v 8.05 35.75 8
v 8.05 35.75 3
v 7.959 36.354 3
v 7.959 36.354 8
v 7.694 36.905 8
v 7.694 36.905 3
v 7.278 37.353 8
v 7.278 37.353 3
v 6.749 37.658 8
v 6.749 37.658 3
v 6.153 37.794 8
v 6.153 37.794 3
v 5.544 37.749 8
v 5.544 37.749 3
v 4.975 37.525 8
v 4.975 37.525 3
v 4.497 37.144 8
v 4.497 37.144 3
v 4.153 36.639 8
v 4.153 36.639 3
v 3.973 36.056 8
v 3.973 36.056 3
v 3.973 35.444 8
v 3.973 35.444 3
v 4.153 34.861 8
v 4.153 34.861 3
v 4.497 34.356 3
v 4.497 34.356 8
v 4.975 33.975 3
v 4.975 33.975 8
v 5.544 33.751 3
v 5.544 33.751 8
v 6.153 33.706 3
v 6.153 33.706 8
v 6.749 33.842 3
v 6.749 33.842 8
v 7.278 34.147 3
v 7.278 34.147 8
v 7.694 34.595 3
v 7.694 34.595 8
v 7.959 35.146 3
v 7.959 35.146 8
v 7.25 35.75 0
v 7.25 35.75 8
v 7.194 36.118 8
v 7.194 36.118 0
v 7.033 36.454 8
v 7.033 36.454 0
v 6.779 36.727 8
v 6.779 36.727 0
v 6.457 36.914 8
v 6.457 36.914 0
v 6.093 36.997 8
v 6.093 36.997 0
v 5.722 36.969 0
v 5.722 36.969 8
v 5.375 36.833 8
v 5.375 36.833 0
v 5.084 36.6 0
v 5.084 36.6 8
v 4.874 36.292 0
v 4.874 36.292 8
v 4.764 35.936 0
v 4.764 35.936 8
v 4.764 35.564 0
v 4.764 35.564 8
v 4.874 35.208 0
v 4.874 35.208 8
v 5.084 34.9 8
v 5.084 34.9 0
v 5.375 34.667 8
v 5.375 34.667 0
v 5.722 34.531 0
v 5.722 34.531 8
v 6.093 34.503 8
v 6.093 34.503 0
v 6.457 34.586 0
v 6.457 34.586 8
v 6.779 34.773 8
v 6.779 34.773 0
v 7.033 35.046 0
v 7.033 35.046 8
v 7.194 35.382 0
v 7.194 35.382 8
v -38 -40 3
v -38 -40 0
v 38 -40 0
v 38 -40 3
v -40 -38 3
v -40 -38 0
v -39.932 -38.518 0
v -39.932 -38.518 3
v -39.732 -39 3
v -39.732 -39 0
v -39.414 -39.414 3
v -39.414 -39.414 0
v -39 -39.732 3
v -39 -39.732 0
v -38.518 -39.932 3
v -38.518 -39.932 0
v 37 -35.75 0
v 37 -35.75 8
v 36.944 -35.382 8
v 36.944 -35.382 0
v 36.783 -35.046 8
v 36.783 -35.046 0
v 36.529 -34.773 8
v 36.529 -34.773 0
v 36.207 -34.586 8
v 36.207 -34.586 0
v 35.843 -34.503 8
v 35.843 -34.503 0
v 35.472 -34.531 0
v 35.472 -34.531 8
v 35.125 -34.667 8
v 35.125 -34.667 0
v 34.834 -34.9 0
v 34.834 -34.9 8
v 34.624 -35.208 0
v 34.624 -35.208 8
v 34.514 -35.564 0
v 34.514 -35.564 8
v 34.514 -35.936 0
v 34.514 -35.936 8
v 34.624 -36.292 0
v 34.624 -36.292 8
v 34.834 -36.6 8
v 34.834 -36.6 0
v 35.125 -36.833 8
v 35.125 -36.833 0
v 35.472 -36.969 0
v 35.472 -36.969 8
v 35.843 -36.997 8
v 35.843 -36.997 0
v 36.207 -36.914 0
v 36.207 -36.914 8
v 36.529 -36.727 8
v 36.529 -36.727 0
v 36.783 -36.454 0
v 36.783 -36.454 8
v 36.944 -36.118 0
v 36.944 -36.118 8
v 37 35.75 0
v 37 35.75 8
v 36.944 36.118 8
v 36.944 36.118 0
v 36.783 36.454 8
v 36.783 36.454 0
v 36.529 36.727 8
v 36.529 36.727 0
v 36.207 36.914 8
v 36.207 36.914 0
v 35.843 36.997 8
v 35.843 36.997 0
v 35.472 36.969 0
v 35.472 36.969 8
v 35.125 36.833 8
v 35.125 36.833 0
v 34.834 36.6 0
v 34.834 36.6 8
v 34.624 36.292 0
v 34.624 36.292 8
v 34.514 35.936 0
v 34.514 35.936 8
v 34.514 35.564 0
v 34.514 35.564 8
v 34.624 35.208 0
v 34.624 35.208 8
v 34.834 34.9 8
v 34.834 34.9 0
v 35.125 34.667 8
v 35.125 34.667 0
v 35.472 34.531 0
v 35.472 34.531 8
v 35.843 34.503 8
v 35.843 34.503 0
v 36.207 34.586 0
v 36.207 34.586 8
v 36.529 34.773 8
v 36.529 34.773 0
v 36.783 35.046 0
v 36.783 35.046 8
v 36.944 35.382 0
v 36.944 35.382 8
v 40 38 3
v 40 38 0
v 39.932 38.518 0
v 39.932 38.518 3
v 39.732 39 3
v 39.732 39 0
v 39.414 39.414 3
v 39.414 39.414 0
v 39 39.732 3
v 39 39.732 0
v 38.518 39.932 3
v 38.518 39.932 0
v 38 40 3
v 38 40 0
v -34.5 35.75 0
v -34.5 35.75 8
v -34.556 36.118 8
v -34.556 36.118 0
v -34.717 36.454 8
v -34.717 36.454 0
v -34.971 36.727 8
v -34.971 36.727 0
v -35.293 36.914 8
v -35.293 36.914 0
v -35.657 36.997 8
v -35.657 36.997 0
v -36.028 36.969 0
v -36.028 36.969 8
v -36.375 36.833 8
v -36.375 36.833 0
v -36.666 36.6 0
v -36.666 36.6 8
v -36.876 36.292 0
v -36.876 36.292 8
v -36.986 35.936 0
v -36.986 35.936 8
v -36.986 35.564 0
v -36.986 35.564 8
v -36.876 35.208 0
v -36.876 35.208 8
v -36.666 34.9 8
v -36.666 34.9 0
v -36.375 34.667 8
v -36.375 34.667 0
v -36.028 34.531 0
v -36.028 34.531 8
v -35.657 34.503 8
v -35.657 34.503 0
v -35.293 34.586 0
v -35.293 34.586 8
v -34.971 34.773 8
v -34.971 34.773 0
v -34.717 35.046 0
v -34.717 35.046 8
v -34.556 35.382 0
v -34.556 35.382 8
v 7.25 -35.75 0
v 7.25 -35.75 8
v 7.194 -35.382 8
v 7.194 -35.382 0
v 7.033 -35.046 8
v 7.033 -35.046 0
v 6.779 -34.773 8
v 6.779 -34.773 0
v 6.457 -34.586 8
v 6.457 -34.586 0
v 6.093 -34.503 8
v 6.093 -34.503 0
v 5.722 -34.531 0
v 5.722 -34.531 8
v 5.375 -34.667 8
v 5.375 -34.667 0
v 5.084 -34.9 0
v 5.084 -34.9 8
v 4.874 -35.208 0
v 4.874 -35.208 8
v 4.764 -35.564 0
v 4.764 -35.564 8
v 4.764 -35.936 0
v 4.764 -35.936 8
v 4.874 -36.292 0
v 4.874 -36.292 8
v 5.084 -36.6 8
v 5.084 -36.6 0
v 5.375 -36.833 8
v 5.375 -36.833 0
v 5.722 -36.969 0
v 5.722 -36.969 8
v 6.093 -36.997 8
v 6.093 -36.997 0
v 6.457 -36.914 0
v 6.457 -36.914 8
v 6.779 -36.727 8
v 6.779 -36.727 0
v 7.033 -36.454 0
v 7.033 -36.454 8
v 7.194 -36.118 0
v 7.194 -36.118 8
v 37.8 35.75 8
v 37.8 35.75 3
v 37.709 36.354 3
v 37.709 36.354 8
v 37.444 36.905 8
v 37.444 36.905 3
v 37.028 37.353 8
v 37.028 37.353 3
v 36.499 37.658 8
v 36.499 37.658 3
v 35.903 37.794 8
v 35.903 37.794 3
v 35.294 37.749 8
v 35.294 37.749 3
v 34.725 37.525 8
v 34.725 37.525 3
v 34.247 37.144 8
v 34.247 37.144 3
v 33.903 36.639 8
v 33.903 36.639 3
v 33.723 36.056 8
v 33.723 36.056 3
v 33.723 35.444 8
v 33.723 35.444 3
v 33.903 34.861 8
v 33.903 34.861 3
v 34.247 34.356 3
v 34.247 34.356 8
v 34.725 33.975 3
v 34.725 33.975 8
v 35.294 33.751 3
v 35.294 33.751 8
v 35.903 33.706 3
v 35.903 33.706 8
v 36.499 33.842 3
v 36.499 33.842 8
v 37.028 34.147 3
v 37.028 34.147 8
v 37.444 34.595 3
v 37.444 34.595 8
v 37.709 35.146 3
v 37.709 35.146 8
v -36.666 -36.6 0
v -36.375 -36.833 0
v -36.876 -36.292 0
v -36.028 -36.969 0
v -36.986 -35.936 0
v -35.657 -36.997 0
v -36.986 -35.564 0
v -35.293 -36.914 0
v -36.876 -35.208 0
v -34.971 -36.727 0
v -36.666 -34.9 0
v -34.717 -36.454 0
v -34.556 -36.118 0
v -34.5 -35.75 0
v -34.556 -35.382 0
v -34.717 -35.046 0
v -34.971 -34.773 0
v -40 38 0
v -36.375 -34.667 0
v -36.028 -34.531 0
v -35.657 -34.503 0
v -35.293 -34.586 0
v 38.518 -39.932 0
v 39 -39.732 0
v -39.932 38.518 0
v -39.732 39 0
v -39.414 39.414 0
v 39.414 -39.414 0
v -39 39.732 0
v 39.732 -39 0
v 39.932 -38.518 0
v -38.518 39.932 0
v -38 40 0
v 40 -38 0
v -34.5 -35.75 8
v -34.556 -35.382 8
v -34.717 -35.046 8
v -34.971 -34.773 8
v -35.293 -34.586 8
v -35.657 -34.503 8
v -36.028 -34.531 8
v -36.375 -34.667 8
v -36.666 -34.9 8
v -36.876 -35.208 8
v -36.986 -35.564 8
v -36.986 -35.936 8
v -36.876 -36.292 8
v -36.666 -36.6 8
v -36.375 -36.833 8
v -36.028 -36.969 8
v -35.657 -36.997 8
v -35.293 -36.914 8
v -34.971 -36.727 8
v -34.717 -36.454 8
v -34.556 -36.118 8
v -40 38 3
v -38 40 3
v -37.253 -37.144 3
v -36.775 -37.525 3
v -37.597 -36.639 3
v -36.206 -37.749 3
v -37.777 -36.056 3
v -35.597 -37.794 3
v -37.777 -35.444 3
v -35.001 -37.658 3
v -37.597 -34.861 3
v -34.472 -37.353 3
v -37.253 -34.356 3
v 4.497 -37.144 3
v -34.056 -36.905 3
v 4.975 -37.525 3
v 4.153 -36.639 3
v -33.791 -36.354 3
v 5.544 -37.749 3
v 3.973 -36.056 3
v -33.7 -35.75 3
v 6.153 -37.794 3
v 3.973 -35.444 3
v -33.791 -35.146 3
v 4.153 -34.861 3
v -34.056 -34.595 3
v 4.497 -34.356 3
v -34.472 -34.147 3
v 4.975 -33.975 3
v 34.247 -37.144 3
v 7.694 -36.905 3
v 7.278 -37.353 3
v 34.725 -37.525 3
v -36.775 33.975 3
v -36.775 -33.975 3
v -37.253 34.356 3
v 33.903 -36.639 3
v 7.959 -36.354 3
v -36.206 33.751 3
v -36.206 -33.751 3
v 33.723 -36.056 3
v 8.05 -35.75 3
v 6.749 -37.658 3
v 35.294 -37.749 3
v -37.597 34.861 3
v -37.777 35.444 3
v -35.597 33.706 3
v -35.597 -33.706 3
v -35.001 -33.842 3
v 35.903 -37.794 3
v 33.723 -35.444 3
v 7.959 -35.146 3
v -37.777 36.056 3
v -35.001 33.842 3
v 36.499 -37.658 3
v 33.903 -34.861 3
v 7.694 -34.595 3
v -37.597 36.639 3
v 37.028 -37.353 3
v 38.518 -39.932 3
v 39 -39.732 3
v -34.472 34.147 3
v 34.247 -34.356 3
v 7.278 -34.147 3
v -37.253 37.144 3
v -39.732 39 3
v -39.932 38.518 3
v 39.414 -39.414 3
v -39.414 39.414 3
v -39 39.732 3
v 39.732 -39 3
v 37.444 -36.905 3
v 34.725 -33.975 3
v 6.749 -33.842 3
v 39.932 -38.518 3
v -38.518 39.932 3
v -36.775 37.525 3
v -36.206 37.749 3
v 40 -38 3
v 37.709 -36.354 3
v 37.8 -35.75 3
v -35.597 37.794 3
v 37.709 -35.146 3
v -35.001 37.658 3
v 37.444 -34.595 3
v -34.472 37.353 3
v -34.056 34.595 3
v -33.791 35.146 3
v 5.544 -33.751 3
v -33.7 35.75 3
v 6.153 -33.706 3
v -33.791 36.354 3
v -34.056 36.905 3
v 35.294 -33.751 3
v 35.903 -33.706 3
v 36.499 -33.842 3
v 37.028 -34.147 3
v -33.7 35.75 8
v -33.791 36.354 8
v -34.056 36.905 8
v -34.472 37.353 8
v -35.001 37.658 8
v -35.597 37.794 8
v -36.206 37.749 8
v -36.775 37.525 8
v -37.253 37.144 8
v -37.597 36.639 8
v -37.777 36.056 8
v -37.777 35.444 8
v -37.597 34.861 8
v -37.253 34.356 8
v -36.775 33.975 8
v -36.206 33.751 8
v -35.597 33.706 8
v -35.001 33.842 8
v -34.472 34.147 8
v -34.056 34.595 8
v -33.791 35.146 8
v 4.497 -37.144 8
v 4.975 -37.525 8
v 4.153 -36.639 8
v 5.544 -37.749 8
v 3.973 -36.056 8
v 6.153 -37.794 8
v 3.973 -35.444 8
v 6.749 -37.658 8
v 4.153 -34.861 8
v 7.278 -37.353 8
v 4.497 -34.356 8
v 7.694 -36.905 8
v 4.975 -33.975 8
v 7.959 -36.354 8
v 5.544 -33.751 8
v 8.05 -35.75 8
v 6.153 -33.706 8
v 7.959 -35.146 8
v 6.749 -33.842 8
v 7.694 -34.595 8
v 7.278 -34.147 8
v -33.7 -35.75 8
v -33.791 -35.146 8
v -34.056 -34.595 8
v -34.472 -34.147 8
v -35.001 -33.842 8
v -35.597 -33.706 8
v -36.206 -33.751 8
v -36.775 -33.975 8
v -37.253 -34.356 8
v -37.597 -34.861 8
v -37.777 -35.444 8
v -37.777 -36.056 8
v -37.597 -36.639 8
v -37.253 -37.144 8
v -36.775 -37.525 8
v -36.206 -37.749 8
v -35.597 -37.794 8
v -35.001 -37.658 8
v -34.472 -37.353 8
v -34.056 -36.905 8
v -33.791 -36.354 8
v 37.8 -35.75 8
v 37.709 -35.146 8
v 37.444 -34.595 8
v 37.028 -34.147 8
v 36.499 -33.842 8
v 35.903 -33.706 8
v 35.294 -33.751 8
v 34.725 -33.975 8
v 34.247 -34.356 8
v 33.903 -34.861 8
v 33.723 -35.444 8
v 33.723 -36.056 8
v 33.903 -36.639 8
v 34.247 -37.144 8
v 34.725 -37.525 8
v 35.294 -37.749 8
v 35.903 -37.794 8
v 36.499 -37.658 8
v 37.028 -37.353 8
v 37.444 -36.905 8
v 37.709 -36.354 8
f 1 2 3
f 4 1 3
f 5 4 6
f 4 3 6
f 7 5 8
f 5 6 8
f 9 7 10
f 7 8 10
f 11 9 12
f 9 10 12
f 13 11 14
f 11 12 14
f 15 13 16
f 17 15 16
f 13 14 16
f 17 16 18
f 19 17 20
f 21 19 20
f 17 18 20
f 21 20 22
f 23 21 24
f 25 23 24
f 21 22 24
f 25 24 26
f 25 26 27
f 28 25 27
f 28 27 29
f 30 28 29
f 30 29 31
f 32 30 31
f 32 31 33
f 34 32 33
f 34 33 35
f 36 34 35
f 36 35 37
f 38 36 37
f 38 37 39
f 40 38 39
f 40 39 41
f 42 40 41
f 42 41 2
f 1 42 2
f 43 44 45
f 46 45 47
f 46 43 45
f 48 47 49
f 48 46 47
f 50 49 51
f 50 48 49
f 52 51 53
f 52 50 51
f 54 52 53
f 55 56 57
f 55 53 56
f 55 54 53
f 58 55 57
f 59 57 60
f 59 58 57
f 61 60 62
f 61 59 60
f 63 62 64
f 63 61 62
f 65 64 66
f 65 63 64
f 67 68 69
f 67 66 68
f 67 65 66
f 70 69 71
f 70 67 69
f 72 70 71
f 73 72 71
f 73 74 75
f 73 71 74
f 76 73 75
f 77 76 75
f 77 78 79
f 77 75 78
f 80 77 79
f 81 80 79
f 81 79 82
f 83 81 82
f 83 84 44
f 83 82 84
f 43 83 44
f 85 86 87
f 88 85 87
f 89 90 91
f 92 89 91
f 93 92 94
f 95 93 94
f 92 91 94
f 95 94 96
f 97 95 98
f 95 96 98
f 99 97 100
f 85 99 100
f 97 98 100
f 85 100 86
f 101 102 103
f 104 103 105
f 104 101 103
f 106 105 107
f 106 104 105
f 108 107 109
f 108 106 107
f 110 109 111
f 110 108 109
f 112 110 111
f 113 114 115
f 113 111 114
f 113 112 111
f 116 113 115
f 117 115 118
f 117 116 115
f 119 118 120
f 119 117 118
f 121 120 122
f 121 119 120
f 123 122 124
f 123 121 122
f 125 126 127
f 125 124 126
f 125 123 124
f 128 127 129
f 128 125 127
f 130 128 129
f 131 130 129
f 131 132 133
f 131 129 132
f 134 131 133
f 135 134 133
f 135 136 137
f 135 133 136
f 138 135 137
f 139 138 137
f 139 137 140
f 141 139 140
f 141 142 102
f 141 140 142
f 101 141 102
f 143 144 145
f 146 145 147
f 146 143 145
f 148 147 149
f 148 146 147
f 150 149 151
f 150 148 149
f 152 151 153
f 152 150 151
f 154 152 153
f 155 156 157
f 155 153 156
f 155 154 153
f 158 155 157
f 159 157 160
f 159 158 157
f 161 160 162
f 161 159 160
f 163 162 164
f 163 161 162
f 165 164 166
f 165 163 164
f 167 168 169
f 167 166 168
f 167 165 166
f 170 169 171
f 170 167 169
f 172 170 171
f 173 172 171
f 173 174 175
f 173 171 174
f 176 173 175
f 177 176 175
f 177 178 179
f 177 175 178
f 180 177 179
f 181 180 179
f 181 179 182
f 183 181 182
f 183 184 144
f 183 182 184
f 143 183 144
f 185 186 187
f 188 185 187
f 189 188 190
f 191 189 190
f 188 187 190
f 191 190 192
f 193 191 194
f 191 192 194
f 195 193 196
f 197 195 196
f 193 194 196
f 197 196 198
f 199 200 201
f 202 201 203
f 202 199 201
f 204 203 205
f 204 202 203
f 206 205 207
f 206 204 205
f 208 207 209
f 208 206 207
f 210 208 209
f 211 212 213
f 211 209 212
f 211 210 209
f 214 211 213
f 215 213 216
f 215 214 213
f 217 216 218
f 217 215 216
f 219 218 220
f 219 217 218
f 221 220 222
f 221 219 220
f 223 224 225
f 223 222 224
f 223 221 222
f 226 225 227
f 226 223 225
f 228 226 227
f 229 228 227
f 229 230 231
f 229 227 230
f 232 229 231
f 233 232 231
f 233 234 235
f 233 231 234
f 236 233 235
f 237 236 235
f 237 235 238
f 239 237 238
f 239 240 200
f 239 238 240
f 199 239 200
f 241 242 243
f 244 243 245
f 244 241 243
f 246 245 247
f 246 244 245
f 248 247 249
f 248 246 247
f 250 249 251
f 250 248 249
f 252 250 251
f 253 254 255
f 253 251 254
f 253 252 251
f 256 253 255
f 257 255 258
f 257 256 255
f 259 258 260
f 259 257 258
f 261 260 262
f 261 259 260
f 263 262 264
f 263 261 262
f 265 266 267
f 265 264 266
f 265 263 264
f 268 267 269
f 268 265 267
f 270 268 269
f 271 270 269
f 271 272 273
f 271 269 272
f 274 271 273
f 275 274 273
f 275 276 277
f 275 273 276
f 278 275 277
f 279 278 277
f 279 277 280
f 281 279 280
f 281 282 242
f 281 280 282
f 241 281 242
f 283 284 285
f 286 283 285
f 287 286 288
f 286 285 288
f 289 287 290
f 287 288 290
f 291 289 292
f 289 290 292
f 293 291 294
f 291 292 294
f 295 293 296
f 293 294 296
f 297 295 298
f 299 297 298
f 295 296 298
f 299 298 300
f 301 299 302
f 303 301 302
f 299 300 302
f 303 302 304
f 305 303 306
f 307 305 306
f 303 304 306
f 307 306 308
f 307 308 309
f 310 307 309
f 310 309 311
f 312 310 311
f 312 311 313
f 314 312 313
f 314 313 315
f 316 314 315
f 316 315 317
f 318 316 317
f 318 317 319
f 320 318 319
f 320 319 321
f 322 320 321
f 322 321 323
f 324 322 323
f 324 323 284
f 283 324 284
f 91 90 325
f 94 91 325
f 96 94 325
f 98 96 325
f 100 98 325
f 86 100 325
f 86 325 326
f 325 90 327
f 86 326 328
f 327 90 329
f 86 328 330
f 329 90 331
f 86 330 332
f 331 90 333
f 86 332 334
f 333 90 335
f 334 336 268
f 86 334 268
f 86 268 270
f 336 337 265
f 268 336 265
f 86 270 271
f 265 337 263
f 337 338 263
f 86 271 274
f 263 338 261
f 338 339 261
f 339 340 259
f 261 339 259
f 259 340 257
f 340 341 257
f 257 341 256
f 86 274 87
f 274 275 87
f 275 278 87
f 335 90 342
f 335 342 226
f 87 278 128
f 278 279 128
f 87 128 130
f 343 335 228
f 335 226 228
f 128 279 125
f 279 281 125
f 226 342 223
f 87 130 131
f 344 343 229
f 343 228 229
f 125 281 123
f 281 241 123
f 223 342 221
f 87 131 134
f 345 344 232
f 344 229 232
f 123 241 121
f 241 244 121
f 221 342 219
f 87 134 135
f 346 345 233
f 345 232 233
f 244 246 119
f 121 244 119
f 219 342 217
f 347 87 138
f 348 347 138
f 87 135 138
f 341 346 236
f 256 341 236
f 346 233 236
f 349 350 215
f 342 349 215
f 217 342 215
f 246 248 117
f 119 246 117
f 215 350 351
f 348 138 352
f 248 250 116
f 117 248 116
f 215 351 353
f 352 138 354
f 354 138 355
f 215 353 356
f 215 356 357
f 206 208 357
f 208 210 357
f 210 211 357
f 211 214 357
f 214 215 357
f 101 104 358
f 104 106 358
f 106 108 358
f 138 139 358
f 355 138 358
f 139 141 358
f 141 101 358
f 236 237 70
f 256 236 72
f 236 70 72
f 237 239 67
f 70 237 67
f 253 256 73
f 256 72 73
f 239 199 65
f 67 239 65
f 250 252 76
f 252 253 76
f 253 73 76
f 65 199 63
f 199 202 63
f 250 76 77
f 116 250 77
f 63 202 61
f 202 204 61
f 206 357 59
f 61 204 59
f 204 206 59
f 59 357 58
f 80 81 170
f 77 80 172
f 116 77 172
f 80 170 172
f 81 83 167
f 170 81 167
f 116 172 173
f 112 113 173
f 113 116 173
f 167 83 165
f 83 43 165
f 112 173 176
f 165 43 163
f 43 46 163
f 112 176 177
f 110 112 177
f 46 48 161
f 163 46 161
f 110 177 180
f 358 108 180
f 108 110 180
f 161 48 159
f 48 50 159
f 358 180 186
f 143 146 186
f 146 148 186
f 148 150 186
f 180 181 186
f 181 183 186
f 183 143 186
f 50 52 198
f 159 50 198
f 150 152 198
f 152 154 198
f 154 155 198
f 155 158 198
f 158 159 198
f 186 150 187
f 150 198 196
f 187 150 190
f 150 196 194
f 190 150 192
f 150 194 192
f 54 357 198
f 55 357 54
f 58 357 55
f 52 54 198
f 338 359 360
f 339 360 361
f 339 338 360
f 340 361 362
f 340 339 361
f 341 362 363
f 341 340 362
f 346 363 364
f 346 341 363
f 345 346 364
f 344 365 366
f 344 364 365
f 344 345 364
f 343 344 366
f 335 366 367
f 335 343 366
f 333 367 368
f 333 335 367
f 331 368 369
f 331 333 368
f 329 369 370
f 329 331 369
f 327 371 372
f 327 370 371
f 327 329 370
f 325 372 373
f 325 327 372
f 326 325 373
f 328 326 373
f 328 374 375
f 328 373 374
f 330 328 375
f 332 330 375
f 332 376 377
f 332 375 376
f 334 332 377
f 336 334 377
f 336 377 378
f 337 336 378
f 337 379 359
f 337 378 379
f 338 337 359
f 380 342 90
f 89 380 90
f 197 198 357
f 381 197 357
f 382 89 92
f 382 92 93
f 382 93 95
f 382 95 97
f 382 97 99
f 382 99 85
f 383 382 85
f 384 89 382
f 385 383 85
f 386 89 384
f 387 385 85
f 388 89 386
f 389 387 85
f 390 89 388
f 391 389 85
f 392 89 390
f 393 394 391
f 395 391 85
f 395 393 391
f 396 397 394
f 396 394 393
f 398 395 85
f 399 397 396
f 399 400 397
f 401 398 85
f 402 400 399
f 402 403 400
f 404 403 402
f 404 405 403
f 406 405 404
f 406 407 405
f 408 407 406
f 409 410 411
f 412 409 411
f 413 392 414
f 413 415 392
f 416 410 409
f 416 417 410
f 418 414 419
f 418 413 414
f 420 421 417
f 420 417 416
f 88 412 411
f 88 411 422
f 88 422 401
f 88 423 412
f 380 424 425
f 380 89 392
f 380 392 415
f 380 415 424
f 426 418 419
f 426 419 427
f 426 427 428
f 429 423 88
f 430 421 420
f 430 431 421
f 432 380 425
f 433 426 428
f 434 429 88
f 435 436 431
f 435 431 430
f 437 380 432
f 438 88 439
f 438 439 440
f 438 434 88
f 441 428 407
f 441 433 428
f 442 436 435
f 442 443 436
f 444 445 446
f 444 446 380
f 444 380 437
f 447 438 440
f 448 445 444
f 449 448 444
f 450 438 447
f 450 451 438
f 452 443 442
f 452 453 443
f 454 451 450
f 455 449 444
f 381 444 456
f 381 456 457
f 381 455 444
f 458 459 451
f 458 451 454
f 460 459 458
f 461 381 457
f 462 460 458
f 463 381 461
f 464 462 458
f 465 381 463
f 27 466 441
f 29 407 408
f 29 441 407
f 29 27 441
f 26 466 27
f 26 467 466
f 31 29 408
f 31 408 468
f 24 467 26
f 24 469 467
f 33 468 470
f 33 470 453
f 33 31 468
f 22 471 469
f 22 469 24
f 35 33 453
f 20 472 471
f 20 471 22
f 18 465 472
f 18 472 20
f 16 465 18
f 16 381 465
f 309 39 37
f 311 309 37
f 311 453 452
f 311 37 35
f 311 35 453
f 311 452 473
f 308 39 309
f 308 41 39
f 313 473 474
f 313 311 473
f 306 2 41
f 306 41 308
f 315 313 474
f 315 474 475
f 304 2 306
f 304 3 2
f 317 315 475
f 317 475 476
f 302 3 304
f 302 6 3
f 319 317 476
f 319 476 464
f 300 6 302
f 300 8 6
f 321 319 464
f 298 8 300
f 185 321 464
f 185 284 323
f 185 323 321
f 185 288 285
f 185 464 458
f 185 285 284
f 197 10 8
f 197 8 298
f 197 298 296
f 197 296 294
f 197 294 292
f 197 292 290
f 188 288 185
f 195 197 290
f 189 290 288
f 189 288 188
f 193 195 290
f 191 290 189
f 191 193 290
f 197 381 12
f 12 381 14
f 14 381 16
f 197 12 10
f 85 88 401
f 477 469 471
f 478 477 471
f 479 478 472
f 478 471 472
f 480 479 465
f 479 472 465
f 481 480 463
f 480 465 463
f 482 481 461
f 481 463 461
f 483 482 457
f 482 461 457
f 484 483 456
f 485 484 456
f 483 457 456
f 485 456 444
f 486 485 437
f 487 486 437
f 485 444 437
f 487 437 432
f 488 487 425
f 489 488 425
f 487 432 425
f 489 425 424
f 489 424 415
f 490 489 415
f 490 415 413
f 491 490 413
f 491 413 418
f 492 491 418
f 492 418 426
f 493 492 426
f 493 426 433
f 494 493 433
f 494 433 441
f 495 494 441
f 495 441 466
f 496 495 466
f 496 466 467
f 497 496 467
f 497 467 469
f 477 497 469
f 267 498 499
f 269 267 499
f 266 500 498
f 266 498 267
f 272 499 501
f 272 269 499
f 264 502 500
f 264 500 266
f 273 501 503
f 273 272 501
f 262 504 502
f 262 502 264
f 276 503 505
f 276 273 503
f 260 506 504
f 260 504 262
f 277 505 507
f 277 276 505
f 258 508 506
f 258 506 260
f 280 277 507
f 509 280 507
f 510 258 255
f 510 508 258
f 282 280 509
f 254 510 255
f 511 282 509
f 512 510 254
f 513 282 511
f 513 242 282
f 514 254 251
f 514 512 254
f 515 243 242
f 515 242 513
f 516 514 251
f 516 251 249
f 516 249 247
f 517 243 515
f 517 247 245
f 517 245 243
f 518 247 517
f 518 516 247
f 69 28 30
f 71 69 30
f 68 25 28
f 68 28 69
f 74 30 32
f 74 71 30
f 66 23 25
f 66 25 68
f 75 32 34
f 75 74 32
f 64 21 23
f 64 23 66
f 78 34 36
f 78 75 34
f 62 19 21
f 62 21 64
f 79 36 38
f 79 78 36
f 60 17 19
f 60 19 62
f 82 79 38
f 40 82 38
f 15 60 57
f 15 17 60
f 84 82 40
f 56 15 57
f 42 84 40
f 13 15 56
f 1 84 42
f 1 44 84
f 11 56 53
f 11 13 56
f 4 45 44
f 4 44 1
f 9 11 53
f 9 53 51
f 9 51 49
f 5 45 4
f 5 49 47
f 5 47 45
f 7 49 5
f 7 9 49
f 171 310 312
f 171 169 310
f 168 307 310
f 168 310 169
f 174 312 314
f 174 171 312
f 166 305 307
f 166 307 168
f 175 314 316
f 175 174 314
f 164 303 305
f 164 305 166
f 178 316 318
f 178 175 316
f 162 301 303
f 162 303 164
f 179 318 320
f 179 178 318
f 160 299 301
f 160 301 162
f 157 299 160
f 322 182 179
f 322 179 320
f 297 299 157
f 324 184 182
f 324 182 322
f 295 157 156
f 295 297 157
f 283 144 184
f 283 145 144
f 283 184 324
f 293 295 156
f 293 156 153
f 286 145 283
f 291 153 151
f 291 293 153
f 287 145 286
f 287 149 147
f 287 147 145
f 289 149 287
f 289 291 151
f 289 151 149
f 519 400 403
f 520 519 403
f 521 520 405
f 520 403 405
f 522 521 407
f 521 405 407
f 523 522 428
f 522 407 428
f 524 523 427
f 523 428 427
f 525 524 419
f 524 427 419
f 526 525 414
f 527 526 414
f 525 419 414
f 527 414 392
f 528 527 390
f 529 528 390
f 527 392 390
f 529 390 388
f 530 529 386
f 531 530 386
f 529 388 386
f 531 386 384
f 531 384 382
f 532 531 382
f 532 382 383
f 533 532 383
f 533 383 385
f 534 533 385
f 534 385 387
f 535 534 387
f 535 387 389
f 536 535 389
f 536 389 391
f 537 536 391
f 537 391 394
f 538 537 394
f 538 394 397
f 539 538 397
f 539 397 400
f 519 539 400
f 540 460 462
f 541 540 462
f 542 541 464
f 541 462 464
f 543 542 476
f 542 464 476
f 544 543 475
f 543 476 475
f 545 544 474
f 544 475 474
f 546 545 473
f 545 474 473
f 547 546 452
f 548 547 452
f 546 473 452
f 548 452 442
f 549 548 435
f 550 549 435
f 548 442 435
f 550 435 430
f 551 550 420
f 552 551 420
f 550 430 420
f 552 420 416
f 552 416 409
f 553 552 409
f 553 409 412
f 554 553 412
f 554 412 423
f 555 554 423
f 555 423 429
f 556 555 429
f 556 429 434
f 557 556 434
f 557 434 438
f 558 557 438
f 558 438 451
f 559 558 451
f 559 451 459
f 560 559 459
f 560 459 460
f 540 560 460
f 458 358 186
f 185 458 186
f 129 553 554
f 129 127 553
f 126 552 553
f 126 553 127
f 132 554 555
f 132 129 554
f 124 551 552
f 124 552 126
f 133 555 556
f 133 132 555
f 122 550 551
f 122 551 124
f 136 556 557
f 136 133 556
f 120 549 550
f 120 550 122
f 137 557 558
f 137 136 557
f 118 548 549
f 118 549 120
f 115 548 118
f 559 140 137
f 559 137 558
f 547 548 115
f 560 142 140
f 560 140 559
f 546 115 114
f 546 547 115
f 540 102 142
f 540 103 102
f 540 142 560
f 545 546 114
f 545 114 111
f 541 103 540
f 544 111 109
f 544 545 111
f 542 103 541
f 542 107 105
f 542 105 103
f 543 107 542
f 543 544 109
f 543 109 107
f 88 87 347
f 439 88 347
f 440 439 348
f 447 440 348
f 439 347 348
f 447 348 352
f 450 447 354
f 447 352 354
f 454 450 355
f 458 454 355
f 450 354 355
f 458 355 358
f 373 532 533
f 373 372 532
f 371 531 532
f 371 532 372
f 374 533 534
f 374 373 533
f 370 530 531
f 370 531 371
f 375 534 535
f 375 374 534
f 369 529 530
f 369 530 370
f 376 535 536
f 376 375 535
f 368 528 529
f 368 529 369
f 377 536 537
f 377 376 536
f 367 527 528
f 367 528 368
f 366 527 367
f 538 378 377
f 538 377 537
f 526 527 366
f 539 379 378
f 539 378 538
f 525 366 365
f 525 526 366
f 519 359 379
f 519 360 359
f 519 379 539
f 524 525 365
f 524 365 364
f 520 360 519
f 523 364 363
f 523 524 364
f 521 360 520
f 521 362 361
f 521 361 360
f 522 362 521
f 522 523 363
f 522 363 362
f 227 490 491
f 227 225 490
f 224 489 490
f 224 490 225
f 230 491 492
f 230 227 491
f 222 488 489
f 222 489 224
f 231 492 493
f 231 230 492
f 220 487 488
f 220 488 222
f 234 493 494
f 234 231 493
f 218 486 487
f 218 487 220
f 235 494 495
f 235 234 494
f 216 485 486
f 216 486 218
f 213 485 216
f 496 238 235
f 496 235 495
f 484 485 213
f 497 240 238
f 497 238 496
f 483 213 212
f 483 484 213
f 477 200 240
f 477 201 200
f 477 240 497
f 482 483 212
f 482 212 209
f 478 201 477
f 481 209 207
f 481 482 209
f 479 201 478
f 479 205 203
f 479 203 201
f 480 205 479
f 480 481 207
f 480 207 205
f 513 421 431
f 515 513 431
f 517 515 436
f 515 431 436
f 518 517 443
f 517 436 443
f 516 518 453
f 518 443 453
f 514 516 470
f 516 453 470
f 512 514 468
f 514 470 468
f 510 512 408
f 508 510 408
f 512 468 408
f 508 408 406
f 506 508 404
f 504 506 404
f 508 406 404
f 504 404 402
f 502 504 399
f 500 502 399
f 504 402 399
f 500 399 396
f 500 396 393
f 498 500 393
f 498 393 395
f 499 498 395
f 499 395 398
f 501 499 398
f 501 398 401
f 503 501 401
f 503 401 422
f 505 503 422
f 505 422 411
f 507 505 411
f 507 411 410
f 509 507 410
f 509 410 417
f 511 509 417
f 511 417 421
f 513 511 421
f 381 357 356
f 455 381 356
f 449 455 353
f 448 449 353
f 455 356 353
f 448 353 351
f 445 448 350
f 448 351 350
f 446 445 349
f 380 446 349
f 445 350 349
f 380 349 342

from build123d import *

# Parameters (mm, degrees)
F3_DEPTH = 3
F1_R     = 2.05
F4_DEPTH = 8
F2_R     = 1.25
F5_DEPTH = 8.001


with BuildPart() as f3:
    # F0 (on Top) → F3 (new body)
    with BuildSketch(Plane.XY):
        with BuildLine():
            Line((38, 40), (-38, 40))
            ThreePointArc((-38, 40), (-39.414214, 39.414214), (-40, 38))
            Line((-40, 38), (-40, -38))
            ThreePointArc((-40, -38), (-39.414214, -39.414214), (-38, -40))
            Line((-38, -40), (38, -40))
            ThreePointArc((38, -40), (39.414214, -39.414214), (40, -38))
            Line((40, -38), (40, 38))
            ThreePointArc((40, 38), (39.414214, 39.414214), (38, 40))
        make_face()
    extrude(amount=F3_DEPTH)

    # F1 (on Top) → F4 (join)
    with BuildSketch(Plane.XY):
        with Locations((-35.75, 35.75)):
            Circle(F1_R)
        with Locations((6, 35.75)):
            Circle(F1_R)
        with Locations((35.75, 35.75)):
            Circle(F1_R)
        with Locations((35.75, -35.75)):
            Circle(F1_R)
        with Locations((6, -35.75)):
            Circle(F1_R)
        with Locations((-35.75, -35.75)):
            Circle(F1_R)
    extrude(amount=F4_DEPTH)

    # F2 (on Top) → F5 (cut, through all)
    with BuildSketch(Plane.XY):
        with Locations((-35.75, 35.75)):
            Circle(F2_R)
        with Locations((6, 35.75)):
            Circle(F2_R)
        with Locations((35.75, 35.75)):
            Circle(F2_R)
        with Locations((35.75, -35.75)):
            Circle(F2_R)
        with Locations((6, -35.75)):
            Circle(F2_R)
        with Locations((-35.75, -35.75)):
            Circle(F2_R)
    extrude(amount=F5_DEPTH, mode=Mode.SUBTRACT)


solid = f3.part
